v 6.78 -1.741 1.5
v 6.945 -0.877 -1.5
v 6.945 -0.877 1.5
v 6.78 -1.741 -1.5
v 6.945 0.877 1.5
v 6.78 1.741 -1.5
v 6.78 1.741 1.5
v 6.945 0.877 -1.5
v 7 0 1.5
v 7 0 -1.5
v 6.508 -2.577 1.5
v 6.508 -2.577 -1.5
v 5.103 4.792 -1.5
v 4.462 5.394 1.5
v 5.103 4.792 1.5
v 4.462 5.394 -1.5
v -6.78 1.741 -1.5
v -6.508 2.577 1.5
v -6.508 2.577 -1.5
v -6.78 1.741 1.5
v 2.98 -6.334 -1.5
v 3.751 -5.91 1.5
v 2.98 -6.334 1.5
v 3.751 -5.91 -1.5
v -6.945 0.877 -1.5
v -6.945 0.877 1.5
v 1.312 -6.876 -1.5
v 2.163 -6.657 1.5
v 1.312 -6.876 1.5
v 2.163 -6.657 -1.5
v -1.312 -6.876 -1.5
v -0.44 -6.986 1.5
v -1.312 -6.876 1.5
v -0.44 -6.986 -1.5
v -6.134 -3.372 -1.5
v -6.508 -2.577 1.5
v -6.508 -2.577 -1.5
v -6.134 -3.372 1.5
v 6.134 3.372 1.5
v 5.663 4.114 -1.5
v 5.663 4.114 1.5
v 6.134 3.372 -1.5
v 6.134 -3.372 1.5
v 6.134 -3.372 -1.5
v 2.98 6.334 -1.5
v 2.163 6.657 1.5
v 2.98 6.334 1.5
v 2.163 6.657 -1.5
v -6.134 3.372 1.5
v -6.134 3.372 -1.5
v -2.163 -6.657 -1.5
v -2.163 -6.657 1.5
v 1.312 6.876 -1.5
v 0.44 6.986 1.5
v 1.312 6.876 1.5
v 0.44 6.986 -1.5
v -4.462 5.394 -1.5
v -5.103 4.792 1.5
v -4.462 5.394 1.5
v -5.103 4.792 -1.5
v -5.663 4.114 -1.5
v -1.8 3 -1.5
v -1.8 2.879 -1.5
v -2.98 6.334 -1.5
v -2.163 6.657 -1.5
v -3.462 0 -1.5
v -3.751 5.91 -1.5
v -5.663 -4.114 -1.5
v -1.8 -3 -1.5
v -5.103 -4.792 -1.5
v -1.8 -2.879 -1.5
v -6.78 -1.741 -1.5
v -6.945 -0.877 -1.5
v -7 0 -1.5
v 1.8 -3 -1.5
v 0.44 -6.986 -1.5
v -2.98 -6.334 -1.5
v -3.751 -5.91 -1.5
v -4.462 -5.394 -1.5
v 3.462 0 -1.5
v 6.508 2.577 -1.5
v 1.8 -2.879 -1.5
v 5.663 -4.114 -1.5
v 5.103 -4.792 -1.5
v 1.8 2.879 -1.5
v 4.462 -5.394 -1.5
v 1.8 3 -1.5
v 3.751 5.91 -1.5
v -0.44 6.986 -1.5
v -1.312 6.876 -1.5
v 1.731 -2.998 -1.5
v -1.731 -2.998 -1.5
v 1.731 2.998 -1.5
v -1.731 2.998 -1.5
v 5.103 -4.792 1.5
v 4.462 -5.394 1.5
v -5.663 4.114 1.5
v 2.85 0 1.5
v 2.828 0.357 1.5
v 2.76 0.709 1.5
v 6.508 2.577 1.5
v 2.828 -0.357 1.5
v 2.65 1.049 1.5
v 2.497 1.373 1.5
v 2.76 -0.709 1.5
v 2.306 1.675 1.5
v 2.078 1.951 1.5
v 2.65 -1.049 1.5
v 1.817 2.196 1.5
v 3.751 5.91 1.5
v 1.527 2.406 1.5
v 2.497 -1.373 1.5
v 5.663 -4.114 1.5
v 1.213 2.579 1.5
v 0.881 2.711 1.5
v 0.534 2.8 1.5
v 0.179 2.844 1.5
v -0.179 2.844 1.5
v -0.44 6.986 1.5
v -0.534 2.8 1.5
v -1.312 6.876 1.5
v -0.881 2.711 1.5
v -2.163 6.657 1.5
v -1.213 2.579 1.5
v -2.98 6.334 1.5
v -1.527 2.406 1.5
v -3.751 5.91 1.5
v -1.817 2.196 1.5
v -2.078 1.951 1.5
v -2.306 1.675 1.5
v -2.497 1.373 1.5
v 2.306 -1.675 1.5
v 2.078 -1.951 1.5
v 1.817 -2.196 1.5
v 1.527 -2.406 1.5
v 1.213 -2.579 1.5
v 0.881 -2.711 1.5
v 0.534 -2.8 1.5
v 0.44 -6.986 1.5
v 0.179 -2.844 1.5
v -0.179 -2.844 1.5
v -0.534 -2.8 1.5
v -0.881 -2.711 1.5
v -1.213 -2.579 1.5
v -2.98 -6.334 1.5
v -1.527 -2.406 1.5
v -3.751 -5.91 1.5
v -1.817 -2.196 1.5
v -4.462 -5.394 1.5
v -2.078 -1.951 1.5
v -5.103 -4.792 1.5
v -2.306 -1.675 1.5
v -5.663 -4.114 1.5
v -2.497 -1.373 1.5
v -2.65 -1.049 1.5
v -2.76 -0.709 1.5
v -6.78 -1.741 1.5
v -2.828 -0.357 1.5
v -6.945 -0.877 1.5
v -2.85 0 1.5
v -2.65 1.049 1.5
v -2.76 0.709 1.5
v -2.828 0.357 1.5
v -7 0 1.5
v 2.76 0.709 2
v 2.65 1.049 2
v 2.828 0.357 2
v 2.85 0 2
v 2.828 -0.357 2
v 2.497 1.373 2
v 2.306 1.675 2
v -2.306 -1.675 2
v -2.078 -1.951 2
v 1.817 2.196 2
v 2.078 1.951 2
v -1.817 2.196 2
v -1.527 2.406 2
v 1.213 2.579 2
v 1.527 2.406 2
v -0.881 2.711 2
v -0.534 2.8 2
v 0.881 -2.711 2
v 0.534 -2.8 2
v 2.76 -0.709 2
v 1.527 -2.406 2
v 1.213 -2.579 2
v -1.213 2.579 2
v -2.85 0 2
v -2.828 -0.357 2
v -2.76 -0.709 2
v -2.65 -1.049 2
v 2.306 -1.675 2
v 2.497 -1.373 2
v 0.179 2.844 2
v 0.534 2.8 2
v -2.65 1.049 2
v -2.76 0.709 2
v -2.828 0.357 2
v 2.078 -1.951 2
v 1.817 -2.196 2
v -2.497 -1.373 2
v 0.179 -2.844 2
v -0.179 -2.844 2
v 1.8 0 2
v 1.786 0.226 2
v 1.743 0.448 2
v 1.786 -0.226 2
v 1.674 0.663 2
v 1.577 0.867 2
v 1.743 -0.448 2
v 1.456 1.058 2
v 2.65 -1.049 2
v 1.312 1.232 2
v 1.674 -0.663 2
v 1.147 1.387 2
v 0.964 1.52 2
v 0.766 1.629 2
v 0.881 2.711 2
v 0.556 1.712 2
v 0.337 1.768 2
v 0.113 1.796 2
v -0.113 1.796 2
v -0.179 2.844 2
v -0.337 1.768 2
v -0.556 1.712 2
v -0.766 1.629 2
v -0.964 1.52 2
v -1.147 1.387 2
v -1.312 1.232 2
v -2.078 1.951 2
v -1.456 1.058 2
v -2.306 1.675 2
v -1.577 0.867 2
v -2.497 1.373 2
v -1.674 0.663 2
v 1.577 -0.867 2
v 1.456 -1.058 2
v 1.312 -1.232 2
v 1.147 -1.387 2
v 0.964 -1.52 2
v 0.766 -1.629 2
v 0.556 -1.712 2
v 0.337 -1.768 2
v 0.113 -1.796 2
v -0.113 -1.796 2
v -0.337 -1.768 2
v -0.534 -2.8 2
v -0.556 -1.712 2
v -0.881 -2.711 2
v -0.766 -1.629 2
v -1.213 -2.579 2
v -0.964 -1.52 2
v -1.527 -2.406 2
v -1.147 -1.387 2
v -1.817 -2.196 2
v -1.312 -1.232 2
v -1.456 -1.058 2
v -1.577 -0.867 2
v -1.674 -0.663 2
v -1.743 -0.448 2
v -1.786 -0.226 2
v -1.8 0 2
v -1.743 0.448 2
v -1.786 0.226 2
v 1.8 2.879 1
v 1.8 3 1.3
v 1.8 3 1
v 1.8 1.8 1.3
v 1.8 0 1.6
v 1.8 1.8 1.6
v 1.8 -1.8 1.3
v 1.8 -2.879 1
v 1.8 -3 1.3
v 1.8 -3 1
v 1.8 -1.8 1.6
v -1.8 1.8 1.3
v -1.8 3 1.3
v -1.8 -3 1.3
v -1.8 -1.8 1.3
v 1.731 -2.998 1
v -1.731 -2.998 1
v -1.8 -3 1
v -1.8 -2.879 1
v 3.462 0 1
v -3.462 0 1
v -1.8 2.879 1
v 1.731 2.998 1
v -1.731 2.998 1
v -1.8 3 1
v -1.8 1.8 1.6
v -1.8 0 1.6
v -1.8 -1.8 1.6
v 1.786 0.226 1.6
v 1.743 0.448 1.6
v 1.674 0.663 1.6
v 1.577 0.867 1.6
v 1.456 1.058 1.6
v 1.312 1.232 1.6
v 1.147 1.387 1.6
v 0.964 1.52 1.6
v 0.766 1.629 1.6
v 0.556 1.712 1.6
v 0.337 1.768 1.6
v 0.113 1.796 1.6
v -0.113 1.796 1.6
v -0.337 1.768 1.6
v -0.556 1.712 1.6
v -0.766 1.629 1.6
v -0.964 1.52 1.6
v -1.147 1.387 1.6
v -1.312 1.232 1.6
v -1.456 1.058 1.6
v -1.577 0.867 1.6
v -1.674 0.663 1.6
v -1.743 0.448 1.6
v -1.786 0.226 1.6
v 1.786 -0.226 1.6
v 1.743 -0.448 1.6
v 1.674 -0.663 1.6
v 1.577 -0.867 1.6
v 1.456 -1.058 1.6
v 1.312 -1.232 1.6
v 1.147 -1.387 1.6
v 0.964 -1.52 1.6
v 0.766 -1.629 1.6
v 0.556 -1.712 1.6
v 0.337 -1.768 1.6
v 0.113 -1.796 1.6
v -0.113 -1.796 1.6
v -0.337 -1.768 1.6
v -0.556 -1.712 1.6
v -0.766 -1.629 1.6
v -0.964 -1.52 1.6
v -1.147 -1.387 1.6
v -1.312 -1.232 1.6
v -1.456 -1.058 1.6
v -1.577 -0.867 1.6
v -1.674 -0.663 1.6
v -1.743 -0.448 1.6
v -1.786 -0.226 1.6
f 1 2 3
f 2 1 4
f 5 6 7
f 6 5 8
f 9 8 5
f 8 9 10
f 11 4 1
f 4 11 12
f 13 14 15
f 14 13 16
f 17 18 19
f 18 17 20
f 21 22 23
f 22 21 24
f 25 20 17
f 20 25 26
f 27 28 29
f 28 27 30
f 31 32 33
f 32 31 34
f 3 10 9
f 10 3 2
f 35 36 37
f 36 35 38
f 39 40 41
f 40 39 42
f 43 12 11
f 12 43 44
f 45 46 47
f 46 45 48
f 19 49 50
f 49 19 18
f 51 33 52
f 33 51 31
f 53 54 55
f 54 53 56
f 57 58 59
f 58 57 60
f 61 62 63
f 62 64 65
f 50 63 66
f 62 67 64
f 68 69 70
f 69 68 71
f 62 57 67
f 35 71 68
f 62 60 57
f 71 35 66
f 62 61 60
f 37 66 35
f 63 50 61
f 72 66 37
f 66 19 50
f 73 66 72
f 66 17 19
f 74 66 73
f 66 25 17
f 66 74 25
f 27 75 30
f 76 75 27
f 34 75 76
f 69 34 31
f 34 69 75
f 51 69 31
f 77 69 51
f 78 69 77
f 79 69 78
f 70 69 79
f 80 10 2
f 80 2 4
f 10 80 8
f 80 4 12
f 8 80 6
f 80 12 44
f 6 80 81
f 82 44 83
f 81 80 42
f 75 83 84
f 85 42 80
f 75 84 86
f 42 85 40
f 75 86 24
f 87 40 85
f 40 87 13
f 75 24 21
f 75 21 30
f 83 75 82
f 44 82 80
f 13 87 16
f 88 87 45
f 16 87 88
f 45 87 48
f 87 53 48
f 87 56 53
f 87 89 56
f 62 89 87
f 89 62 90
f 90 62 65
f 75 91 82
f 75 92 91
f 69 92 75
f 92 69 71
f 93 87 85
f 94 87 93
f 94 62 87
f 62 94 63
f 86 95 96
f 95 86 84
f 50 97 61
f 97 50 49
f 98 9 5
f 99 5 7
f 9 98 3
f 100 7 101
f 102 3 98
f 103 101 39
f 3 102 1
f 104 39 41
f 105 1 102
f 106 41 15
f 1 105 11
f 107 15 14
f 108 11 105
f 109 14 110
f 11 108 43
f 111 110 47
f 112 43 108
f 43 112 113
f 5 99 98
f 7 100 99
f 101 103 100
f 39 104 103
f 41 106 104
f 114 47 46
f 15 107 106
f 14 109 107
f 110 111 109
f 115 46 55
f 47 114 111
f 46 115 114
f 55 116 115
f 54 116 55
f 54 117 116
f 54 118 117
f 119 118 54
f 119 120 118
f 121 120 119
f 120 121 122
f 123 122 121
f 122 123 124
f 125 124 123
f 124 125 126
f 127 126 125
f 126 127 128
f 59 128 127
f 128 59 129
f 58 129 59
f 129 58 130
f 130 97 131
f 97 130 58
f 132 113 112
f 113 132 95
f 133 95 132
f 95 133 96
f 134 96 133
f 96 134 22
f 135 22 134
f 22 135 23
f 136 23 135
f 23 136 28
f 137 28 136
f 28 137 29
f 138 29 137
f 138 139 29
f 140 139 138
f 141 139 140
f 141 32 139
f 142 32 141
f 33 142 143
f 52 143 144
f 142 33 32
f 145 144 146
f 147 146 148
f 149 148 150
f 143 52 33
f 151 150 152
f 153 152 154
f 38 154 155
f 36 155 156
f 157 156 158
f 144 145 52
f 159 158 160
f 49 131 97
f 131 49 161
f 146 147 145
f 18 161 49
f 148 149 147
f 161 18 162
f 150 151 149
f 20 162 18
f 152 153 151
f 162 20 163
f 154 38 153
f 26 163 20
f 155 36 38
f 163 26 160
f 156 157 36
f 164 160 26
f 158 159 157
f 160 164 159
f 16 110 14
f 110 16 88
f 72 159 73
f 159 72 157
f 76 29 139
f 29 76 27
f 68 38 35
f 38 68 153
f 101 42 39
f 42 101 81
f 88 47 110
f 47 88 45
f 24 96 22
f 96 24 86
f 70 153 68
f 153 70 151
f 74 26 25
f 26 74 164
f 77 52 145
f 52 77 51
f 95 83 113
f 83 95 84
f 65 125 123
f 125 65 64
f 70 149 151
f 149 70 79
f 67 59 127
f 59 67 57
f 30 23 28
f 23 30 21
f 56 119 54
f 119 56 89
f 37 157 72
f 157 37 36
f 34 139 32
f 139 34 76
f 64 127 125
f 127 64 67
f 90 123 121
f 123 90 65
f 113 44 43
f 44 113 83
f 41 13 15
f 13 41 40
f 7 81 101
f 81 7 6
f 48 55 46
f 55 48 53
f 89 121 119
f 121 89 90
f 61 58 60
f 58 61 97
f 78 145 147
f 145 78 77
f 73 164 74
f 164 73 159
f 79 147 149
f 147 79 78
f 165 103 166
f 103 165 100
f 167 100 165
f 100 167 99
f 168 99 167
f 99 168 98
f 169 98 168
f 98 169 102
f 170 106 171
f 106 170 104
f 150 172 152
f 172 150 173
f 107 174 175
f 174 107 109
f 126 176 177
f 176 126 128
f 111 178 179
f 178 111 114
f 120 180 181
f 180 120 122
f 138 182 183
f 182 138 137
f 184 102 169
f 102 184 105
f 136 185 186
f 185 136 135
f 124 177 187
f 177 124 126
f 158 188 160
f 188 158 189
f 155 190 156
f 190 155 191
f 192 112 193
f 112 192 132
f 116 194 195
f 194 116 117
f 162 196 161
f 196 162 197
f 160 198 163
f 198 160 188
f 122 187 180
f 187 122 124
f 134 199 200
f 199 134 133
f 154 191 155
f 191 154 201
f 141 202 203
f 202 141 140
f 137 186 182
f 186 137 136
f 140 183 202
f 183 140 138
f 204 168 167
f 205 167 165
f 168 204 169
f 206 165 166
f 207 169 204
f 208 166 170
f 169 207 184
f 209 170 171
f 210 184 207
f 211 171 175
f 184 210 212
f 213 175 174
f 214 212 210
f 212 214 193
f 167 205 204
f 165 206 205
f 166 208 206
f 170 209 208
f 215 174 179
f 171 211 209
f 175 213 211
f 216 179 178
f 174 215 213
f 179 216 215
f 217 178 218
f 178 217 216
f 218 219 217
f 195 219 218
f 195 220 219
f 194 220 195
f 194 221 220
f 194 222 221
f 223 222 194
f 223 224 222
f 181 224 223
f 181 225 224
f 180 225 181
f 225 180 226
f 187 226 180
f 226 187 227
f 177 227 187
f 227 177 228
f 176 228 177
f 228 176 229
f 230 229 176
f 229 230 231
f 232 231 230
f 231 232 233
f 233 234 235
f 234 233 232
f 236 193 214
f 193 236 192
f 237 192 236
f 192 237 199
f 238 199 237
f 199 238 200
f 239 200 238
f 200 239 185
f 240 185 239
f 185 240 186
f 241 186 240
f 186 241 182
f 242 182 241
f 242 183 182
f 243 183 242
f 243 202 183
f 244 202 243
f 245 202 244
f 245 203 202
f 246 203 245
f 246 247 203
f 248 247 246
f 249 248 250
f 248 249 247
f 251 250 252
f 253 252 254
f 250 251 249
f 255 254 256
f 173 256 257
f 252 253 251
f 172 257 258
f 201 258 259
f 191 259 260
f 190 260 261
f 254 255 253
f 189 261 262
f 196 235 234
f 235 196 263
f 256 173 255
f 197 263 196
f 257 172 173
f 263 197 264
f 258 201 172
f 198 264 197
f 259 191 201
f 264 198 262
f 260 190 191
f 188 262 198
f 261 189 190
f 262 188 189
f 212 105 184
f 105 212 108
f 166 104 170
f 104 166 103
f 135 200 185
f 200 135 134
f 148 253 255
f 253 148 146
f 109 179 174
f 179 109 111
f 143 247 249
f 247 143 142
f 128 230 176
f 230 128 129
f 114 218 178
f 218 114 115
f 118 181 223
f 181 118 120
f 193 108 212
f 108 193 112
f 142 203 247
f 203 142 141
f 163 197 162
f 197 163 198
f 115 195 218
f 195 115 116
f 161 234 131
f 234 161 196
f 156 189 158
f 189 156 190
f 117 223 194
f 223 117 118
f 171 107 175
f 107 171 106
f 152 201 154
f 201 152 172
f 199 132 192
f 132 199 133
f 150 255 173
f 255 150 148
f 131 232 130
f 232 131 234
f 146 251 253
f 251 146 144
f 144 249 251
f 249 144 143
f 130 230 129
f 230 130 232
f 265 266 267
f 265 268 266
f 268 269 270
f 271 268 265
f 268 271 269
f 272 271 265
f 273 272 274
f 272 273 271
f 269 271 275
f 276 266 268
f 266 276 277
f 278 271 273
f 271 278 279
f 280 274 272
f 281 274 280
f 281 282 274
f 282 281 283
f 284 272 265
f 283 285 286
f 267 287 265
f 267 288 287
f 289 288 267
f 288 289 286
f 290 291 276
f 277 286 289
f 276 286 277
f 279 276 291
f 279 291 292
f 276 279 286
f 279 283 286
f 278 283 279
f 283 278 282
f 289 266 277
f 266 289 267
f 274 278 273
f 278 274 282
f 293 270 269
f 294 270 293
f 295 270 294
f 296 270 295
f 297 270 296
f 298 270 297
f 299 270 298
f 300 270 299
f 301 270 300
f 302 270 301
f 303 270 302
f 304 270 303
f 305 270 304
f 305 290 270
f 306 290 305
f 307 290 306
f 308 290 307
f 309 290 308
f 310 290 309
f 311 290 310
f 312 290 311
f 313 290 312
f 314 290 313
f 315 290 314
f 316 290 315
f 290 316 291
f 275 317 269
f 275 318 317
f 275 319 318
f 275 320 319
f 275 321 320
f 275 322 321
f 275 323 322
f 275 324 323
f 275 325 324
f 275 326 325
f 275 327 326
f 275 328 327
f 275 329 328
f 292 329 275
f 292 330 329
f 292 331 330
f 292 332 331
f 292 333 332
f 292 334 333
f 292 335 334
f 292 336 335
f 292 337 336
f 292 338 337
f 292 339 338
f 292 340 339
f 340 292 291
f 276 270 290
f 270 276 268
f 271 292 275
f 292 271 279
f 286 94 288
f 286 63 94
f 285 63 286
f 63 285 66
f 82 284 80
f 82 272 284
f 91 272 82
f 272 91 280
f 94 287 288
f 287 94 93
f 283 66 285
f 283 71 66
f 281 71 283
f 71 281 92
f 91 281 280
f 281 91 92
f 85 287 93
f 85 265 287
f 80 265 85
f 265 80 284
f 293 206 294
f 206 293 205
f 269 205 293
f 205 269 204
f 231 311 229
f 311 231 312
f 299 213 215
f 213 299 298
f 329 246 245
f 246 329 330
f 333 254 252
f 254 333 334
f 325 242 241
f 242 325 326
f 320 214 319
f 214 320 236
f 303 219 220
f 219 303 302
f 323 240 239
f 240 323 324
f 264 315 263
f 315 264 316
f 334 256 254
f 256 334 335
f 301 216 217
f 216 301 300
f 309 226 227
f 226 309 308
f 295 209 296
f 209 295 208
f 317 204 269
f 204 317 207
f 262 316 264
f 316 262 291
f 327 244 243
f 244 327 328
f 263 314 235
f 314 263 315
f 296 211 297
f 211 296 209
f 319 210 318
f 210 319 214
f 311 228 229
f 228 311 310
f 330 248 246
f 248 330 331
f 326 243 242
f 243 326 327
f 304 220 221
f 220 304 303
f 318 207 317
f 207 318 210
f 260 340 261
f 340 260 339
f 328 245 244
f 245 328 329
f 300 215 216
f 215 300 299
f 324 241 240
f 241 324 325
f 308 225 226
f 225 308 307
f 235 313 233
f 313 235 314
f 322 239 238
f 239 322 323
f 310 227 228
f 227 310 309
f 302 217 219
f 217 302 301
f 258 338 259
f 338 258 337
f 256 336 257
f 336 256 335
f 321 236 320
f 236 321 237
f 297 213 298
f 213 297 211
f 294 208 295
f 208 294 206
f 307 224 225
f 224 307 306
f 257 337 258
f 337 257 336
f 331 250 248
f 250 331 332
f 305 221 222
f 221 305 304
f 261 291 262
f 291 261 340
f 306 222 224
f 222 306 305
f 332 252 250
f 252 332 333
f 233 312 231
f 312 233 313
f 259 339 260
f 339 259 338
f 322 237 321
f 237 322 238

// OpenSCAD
$fn = 50;


difference() {
	union() {
		translate(v = [0, 0, -1.5000000000]) {
			cylinder(h = 3, r = 7.0000000000);
		}
		translate(v = [0, 0, -1.5000000000]) {
			cylinder(h = 3.5000000000, r = 2.8500000000);
		}
	}
	union() {
		translate(v = [0, 0, -1.5000000000]) {
			rotate(a = [0, 0, 0]) {
				difference() {
					union() {
						translate(v = [-1.8000000000, -3.0000000000, -0.3000000000]) {
							cube(size = [3.6000000000, 6.0000000000, 0.3000000000]);
						}
						translate(v = [-1.8000000000, -1.8000000000, -0.6000000000]) {
							cube(size = [3.6000000000, 3.6000000000, 0.3000000000]);
						}
						translate(v = [-1.8000000000, -3.0000000000, 2.5000000000]) {
							cube(size = [3.6000000000, 6.0000000000, 0.3000000000]);
						}
						translate(v = [-1.8000000000, -1.8000000000, 2.8000000000]) {
							cube(size = [3.6000000000, 3.6000000000, 0.3000000000]);
						}
						linear_extrude(height = 2.5000000000) {
							polygon(points = [[3.4620000000, 0.0000000000], [1.7310000000, 2.9981799479], [-1.7310000000, 2.9981799479], [-3.4620000000, 0.0000000000], [-1.7310000000, -2.9981799479], [1.7310000000, -2.9981799479]]);
						}
						translate(v = [-1.8000000000, -3.0000000000, -0.3000000000]) {
							cube(size = [3.6000000000, 6.0000000000, 0.3000000000]);
						}
						translate(v = [-1.8000000000, -1.8000000000, -0.6000000000]) {
							cube(size = [3.6000000000, 3.6000000000, 0.3000000000]);
						}
						translate(v = [-1.8000000000, -3.0000000000, 2.5000000000]) {
							cube(size = [3.6000000000, 6.0000000000, 0.3000000000]);
						}
						translate(v = [-1.8000000000, -1.8000000000, 2.8000000000]) {
							cube(size = [3.6000000000, 3.6000000000, 0.3000000000]);
						}
						translate(v = [-1.8000000000, -3.0000000000, -0.3000000000]) {
							cube(size = [3.6000000000, 6.0000000000, 0.3000000000]);
						}
						translate(v = [-1.8000000000, -1.8000000000, -0.6000000000]) {
							cube(size = [3.6000000000, 3.6000000000, 0.3000000000]);
						}
						translate(v = [-1.8000000000, -3.0000000000, 2.5000000000]) {
							cube(size = [3.6000000000, 6.0000000000, 0.3000000000]);
						}
						translate(v = [-1.8000000000, -1.8000000000, 2.8000000000]) {
							cube(size = [3.6000000000, 3.6000000000, 0.3000000000]);
						}
					}
					union();
				}
			}
		}
		translate(v = [0, 0, -50.0000000000]) {
			cylinder(h = 100, r = 1.8000000000);
		}
	}
}
